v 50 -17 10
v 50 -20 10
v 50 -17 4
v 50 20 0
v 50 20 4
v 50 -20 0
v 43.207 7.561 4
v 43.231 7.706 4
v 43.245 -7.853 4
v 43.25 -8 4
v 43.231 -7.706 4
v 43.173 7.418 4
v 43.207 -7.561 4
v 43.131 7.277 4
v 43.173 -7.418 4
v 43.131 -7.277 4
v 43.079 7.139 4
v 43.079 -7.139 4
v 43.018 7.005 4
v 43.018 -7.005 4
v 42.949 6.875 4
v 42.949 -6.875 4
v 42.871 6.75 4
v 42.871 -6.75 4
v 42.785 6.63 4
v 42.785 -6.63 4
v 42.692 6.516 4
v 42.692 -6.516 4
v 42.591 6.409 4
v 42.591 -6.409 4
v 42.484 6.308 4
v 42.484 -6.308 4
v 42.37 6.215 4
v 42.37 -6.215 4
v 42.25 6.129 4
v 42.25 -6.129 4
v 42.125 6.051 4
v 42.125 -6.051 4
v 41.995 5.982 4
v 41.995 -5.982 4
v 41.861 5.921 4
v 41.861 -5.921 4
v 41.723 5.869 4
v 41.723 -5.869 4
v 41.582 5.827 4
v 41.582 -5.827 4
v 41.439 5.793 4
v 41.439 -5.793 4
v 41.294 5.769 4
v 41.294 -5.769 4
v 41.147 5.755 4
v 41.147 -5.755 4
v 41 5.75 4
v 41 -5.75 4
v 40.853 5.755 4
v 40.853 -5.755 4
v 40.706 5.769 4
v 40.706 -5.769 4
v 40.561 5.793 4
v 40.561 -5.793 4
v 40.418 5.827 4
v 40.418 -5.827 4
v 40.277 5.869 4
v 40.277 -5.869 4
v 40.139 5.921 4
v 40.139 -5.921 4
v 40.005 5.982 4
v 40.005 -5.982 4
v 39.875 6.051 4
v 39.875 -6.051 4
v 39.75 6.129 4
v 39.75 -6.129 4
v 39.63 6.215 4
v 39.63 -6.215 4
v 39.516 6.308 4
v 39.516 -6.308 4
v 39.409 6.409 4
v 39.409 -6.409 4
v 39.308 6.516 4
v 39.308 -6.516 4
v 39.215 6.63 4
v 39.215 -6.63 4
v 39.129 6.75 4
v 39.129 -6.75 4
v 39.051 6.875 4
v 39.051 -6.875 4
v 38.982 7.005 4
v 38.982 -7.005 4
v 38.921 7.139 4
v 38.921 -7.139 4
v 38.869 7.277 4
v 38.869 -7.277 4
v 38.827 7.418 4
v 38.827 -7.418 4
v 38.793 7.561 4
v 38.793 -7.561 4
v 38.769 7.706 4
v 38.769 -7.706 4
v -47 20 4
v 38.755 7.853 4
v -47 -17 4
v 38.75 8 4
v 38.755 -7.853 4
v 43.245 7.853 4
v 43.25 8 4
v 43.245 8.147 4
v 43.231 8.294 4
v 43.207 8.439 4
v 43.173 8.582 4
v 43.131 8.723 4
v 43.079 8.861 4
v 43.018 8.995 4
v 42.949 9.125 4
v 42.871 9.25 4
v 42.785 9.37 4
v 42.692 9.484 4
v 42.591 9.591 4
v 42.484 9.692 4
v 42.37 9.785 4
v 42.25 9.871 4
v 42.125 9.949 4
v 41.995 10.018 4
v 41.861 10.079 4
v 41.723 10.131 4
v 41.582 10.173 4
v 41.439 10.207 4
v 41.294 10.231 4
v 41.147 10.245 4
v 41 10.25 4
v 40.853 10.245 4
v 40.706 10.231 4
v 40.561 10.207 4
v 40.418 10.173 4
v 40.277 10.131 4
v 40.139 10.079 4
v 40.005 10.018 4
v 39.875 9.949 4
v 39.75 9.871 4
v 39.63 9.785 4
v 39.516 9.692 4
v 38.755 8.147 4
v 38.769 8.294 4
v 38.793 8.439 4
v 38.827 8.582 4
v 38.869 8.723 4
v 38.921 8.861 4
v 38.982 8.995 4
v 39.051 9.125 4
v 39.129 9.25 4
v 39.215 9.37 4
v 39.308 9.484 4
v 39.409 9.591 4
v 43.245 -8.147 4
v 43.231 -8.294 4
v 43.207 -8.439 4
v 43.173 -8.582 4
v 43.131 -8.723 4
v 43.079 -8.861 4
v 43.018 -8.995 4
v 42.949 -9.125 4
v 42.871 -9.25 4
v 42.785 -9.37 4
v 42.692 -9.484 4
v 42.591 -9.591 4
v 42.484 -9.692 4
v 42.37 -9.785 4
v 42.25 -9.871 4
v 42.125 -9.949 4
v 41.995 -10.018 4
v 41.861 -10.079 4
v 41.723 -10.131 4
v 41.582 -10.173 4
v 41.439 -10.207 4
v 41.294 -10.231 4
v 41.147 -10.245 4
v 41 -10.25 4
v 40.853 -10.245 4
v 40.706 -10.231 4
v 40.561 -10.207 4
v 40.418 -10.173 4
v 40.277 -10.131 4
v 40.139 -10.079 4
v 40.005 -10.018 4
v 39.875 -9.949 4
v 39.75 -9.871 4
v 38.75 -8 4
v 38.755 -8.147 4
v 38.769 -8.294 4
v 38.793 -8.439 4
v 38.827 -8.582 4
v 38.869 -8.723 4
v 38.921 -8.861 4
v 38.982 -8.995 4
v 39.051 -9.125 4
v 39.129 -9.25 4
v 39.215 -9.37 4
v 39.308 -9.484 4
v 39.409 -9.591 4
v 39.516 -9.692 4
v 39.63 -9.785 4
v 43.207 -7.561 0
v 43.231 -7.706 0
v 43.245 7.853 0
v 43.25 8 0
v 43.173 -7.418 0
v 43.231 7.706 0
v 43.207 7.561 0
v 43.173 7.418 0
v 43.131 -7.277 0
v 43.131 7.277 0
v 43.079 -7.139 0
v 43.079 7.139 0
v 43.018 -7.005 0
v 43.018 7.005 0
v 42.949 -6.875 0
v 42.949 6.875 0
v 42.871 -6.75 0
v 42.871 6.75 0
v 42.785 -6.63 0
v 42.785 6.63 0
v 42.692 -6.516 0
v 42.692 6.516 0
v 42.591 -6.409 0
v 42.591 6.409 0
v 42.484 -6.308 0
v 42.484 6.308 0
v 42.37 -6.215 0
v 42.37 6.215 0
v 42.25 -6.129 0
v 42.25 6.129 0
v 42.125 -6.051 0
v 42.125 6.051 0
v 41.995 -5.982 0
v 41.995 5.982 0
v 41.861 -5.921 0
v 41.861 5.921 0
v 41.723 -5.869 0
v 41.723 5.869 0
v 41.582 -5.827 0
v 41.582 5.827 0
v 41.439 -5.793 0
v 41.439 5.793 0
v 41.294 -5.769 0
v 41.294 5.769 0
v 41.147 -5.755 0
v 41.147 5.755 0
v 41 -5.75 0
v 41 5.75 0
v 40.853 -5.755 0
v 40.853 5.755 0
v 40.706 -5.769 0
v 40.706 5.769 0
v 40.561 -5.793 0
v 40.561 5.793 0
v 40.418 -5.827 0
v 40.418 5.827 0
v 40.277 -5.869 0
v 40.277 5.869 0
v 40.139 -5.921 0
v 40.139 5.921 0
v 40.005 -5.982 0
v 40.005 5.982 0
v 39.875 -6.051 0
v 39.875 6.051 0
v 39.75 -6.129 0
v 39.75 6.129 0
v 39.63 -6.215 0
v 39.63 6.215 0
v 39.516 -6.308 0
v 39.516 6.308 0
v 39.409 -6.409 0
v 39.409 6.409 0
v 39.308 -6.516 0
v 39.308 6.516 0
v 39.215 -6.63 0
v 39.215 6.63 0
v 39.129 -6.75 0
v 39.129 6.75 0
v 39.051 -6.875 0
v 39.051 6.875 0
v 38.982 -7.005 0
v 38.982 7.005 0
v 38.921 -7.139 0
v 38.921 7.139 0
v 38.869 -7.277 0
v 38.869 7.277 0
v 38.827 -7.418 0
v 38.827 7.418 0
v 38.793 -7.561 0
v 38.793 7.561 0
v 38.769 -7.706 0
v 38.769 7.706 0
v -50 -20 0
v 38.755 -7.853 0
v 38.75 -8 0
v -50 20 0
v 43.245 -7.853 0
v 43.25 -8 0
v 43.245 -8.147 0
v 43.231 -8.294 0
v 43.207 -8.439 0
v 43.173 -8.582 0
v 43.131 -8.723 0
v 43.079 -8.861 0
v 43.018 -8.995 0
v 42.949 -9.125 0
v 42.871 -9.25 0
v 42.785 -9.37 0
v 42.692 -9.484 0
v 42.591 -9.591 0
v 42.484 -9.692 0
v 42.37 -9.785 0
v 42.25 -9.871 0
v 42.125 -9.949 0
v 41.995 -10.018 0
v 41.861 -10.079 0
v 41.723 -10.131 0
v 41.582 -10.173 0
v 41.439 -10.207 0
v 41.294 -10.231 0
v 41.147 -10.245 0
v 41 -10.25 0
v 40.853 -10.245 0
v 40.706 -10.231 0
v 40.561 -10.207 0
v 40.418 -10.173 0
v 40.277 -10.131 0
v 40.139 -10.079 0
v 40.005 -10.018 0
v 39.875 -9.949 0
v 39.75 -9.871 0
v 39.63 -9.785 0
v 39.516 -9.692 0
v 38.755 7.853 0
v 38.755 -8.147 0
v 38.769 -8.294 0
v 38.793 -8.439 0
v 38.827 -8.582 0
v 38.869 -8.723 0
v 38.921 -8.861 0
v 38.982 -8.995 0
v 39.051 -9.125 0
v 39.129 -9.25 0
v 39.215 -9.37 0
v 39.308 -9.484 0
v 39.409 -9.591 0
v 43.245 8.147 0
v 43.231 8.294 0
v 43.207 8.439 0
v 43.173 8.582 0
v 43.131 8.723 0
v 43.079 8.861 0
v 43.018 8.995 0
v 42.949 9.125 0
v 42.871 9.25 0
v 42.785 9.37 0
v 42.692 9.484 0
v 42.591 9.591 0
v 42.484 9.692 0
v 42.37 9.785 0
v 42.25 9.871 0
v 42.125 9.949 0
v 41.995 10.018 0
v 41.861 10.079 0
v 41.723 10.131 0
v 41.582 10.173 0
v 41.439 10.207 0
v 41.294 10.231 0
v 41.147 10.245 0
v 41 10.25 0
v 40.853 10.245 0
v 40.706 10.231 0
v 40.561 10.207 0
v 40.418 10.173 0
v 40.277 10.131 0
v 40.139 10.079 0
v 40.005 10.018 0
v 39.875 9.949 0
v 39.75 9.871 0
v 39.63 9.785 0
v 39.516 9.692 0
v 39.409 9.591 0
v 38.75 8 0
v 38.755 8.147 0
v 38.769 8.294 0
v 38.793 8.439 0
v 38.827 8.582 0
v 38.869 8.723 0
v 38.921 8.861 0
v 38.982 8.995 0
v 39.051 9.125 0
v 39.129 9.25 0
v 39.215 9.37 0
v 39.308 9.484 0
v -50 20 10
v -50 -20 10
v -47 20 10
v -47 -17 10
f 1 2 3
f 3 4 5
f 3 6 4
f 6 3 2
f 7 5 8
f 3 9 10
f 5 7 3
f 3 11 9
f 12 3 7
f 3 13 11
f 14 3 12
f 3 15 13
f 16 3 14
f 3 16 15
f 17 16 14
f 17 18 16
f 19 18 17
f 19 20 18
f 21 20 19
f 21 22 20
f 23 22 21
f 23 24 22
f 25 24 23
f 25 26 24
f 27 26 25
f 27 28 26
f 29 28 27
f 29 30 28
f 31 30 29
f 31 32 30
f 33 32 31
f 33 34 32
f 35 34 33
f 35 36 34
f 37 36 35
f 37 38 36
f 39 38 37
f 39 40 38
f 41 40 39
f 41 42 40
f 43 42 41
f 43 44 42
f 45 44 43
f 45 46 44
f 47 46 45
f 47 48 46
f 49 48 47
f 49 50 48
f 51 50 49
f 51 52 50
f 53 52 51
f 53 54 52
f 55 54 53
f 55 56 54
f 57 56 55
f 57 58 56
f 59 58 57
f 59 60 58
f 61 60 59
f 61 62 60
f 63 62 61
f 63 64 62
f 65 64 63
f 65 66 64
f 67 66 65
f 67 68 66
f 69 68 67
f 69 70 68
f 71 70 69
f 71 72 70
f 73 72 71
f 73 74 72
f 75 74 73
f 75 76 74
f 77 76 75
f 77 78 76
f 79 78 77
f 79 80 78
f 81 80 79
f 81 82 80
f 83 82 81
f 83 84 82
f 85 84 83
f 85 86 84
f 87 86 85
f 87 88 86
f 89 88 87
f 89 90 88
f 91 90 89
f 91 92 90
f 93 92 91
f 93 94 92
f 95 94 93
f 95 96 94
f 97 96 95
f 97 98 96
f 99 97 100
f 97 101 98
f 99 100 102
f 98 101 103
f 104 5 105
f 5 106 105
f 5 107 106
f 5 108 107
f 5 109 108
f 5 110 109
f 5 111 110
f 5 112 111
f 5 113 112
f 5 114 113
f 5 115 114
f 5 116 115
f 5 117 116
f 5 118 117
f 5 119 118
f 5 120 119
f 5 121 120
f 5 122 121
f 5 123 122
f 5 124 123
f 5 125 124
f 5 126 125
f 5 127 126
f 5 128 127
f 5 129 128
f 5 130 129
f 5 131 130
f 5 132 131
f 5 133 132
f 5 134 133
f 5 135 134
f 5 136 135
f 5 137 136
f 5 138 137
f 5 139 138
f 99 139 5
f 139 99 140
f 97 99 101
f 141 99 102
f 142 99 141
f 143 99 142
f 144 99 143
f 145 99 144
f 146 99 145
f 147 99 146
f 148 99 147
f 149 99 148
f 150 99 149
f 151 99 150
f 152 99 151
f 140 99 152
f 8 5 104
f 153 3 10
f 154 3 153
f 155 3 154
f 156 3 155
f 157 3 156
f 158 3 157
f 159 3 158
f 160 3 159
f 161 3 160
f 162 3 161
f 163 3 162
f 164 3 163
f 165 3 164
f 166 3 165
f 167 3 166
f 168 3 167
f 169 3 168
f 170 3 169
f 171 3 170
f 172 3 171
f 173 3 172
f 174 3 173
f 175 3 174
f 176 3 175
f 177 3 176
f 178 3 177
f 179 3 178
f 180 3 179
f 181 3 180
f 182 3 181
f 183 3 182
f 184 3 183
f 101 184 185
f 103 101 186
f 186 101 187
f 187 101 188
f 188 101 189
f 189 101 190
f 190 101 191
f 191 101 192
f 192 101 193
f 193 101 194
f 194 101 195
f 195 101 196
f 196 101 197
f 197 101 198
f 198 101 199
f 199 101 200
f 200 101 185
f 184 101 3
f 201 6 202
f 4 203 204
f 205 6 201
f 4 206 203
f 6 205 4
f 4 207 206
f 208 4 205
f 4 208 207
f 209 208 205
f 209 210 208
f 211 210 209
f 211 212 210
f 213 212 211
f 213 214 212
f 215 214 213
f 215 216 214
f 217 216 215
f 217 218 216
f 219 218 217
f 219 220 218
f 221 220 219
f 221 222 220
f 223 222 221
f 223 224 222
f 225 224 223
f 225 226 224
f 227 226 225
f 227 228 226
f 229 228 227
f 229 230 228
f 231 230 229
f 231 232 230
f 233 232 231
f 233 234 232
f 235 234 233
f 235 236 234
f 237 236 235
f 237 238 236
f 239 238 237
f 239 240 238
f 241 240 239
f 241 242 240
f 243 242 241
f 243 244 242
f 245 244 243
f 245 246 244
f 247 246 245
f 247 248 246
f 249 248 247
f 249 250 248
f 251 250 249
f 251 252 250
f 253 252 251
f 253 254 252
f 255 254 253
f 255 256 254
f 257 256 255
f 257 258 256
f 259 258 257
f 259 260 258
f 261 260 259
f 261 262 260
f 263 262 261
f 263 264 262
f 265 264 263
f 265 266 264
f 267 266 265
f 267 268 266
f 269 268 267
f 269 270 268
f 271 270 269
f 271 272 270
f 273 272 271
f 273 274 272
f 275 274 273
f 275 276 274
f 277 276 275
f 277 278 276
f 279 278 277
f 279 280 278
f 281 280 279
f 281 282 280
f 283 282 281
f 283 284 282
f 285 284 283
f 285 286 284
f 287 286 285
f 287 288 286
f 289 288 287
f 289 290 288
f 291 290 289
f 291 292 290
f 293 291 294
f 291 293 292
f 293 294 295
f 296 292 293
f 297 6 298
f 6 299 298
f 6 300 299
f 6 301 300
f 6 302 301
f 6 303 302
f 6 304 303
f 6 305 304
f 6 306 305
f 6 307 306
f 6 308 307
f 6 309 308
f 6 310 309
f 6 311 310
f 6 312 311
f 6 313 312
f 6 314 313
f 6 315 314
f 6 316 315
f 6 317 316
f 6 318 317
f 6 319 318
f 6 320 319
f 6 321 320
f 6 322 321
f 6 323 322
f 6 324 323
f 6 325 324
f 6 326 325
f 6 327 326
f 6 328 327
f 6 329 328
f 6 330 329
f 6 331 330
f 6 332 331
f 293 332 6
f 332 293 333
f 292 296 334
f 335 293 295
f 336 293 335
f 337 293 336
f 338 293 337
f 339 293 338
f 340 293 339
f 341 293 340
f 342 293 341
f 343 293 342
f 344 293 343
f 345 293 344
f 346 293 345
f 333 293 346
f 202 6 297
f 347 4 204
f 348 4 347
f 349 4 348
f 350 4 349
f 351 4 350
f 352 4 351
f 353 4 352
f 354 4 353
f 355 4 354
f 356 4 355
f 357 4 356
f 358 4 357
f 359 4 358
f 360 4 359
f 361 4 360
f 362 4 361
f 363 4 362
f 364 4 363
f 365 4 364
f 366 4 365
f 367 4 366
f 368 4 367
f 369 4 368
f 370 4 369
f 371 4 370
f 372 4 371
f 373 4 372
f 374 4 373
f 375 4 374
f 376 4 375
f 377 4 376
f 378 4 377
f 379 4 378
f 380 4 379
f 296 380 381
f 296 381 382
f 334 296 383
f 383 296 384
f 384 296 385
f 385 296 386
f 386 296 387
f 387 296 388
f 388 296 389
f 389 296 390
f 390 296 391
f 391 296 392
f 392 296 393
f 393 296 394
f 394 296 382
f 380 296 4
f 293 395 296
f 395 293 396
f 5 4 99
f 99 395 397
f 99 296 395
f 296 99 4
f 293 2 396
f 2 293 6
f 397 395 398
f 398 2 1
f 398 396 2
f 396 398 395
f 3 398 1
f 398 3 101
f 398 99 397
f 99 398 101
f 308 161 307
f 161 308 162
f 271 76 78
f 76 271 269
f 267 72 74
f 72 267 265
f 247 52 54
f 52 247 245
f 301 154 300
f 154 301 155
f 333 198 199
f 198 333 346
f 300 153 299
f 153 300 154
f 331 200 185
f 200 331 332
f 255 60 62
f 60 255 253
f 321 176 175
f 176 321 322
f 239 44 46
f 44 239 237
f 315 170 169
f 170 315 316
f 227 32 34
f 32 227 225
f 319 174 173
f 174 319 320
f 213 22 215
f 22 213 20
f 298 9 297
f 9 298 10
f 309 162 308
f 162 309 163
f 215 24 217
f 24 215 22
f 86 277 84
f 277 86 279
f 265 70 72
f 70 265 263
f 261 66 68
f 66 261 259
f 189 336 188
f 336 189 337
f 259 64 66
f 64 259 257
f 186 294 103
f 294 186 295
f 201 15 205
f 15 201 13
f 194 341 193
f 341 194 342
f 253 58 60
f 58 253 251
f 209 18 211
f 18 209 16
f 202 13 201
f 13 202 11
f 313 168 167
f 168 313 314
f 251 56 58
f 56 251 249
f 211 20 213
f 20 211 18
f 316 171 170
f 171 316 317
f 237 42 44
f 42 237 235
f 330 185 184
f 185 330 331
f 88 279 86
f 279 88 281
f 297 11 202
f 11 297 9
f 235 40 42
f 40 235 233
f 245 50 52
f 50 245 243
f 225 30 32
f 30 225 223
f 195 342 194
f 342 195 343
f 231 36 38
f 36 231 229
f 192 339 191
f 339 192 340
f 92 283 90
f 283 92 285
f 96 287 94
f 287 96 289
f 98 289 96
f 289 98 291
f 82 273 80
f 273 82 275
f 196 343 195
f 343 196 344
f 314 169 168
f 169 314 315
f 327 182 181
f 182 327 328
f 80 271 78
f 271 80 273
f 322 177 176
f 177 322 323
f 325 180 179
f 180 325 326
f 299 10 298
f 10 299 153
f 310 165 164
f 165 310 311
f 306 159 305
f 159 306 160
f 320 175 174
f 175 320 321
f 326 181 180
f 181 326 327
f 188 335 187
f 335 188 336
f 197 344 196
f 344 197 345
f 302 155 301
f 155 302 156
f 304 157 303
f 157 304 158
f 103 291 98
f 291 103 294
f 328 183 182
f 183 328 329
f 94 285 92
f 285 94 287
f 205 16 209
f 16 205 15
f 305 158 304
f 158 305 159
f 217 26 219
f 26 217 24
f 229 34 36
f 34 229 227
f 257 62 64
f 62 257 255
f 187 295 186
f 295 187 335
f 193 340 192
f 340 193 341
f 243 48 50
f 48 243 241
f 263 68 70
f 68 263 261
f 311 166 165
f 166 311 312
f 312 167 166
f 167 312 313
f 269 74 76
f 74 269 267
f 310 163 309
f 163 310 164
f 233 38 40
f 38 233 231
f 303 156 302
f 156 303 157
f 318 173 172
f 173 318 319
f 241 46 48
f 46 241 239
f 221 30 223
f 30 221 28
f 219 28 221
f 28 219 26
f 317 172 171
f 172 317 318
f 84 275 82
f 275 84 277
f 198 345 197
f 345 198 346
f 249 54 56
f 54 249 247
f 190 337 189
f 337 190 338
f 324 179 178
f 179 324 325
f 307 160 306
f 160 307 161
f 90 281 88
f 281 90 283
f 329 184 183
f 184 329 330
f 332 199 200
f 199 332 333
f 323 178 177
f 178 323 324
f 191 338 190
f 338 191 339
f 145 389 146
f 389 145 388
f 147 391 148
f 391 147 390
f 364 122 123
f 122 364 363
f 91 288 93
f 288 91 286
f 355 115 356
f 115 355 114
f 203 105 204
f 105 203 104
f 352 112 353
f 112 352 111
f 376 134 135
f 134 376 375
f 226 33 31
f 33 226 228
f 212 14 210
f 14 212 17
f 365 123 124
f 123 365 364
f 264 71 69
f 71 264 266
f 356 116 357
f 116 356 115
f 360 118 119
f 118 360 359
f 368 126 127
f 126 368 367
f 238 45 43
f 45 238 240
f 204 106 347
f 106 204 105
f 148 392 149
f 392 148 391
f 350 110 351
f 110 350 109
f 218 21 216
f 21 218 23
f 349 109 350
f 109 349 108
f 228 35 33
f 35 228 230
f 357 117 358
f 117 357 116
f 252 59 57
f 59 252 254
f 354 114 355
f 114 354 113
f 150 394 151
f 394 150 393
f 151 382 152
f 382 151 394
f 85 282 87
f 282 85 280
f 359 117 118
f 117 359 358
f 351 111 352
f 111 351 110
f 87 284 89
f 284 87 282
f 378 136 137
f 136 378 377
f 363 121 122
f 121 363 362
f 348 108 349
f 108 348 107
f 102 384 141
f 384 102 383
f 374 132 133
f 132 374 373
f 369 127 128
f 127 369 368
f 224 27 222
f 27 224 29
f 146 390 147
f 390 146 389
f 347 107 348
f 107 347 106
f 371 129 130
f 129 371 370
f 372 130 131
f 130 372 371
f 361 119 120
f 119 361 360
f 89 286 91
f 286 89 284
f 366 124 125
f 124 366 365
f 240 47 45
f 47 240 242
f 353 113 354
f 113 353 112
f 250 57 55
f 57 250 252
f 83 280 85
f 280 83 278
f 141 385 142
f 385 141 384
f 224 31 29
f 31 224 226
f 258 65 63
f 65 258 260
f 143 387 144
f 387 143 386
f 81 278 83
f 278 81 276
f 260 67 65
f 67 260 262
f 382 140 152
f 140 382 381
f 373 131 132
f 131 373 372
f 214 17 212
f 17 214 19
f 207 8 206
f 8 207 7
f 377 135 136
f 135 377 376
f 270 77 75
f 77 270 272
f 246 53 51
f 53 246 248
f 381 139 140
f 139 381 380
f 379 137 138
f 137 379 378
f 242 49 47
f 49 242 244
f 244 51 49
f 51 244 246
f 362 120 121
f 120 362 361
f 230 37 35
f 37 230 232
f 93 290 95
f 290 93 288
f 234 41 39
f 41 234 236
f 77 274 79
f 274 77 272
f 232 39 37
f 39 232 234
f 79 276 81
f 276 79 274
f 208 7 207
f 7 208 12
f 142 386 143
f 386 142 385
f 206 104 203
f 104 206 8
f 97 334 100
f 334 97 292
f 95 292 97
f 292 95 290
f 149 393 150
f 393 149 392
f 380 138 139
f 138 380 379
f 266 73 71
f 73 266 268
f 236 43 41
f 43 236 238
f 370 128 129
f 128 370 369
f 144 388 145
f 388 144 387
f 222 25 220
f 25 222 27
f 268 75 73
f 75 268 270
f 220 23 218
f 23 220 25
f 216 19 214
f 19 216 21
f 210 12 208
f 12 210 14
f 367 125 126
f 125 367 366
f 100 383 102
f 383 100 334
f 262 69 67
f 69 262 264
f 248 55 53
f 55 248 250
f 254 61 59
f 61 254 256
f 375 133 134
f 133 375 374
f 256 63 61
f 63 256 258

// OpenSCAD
// Microscope-slide registration jig with two clamp holes
// Category: benchware; Purpose: repeatable origin when photographing a 75 x 25 mm microscope slide.
// Print: FDM, on the broad bottom face at z=0; no support required.
// This is a geometric reference design; no dimensional fit or lab use has been physically validated.
// SPDX-License-Identifier: CERN-OHL-P-2.0

/* [Platform] */
// Overall platform length, X (mm)
base_l = 100; // 0.5
// Overall platform width, Y (mm)
base_w = 40; // 0.5
// Platform thickness (mm)
base_h = 4; // 0.5

/* [Registration Edges] */
// Width of each perpendicular registration rail (mm)
rail_w = 3; // 0.1
// Height of rails above print bed (mm)
rail_top = 10; // 0.5

/* [Fasteners] */
// Diameter of each right-side mounting hole (mm)
bore_d = 4.5; // 0.1
// X coordinate of the mounting-hole centers (mm)
bore_x = 41; // 0.5
// Absolute Y coordinate of mounting-hole centers (mm)
bore_y = 8; // 0.5

/* [Hidden] */
$fn = 96;
eps = 0.1;
assert(base_l >= 90 && base_w >= 35);
assert(rail_w >= 1.6 && rail_top >= base_h + 2);
assert(bore_d > 0 && bore_d < 8);
assert(bore_x + bore_d/2 < base_l/2 - 1);
assert(bore_x - bore_d/2 > -base_l/2 + rail_w + 1);
assert(bore_y + bore_d/2 < base_w/2 - 1);
assert(bore_y - bore_d/2 > -base_w/2 + rail_w + 1);
assert(bore_d / 2 + 2 < bore_y);

difference() {
    union() {
        translate([-base_l/2, -base_w/2, 0])
            cube([base_l, base_w, base_h]);
        translate([-base_l/2, -base_w/2, base_h])
            cube([base_l, rail_w, rail_top-base_h]);
        translate([-base_l/2, -base_w/2, base_h])
            cube([rail_w, base_w, rail_top-base_h]);
    }
    for (sign=[-1,1])
        translate([bore_x, sign*bore_y, -eps])
            cylinder(h=base_h+2*eps, d=bore_d);
}
